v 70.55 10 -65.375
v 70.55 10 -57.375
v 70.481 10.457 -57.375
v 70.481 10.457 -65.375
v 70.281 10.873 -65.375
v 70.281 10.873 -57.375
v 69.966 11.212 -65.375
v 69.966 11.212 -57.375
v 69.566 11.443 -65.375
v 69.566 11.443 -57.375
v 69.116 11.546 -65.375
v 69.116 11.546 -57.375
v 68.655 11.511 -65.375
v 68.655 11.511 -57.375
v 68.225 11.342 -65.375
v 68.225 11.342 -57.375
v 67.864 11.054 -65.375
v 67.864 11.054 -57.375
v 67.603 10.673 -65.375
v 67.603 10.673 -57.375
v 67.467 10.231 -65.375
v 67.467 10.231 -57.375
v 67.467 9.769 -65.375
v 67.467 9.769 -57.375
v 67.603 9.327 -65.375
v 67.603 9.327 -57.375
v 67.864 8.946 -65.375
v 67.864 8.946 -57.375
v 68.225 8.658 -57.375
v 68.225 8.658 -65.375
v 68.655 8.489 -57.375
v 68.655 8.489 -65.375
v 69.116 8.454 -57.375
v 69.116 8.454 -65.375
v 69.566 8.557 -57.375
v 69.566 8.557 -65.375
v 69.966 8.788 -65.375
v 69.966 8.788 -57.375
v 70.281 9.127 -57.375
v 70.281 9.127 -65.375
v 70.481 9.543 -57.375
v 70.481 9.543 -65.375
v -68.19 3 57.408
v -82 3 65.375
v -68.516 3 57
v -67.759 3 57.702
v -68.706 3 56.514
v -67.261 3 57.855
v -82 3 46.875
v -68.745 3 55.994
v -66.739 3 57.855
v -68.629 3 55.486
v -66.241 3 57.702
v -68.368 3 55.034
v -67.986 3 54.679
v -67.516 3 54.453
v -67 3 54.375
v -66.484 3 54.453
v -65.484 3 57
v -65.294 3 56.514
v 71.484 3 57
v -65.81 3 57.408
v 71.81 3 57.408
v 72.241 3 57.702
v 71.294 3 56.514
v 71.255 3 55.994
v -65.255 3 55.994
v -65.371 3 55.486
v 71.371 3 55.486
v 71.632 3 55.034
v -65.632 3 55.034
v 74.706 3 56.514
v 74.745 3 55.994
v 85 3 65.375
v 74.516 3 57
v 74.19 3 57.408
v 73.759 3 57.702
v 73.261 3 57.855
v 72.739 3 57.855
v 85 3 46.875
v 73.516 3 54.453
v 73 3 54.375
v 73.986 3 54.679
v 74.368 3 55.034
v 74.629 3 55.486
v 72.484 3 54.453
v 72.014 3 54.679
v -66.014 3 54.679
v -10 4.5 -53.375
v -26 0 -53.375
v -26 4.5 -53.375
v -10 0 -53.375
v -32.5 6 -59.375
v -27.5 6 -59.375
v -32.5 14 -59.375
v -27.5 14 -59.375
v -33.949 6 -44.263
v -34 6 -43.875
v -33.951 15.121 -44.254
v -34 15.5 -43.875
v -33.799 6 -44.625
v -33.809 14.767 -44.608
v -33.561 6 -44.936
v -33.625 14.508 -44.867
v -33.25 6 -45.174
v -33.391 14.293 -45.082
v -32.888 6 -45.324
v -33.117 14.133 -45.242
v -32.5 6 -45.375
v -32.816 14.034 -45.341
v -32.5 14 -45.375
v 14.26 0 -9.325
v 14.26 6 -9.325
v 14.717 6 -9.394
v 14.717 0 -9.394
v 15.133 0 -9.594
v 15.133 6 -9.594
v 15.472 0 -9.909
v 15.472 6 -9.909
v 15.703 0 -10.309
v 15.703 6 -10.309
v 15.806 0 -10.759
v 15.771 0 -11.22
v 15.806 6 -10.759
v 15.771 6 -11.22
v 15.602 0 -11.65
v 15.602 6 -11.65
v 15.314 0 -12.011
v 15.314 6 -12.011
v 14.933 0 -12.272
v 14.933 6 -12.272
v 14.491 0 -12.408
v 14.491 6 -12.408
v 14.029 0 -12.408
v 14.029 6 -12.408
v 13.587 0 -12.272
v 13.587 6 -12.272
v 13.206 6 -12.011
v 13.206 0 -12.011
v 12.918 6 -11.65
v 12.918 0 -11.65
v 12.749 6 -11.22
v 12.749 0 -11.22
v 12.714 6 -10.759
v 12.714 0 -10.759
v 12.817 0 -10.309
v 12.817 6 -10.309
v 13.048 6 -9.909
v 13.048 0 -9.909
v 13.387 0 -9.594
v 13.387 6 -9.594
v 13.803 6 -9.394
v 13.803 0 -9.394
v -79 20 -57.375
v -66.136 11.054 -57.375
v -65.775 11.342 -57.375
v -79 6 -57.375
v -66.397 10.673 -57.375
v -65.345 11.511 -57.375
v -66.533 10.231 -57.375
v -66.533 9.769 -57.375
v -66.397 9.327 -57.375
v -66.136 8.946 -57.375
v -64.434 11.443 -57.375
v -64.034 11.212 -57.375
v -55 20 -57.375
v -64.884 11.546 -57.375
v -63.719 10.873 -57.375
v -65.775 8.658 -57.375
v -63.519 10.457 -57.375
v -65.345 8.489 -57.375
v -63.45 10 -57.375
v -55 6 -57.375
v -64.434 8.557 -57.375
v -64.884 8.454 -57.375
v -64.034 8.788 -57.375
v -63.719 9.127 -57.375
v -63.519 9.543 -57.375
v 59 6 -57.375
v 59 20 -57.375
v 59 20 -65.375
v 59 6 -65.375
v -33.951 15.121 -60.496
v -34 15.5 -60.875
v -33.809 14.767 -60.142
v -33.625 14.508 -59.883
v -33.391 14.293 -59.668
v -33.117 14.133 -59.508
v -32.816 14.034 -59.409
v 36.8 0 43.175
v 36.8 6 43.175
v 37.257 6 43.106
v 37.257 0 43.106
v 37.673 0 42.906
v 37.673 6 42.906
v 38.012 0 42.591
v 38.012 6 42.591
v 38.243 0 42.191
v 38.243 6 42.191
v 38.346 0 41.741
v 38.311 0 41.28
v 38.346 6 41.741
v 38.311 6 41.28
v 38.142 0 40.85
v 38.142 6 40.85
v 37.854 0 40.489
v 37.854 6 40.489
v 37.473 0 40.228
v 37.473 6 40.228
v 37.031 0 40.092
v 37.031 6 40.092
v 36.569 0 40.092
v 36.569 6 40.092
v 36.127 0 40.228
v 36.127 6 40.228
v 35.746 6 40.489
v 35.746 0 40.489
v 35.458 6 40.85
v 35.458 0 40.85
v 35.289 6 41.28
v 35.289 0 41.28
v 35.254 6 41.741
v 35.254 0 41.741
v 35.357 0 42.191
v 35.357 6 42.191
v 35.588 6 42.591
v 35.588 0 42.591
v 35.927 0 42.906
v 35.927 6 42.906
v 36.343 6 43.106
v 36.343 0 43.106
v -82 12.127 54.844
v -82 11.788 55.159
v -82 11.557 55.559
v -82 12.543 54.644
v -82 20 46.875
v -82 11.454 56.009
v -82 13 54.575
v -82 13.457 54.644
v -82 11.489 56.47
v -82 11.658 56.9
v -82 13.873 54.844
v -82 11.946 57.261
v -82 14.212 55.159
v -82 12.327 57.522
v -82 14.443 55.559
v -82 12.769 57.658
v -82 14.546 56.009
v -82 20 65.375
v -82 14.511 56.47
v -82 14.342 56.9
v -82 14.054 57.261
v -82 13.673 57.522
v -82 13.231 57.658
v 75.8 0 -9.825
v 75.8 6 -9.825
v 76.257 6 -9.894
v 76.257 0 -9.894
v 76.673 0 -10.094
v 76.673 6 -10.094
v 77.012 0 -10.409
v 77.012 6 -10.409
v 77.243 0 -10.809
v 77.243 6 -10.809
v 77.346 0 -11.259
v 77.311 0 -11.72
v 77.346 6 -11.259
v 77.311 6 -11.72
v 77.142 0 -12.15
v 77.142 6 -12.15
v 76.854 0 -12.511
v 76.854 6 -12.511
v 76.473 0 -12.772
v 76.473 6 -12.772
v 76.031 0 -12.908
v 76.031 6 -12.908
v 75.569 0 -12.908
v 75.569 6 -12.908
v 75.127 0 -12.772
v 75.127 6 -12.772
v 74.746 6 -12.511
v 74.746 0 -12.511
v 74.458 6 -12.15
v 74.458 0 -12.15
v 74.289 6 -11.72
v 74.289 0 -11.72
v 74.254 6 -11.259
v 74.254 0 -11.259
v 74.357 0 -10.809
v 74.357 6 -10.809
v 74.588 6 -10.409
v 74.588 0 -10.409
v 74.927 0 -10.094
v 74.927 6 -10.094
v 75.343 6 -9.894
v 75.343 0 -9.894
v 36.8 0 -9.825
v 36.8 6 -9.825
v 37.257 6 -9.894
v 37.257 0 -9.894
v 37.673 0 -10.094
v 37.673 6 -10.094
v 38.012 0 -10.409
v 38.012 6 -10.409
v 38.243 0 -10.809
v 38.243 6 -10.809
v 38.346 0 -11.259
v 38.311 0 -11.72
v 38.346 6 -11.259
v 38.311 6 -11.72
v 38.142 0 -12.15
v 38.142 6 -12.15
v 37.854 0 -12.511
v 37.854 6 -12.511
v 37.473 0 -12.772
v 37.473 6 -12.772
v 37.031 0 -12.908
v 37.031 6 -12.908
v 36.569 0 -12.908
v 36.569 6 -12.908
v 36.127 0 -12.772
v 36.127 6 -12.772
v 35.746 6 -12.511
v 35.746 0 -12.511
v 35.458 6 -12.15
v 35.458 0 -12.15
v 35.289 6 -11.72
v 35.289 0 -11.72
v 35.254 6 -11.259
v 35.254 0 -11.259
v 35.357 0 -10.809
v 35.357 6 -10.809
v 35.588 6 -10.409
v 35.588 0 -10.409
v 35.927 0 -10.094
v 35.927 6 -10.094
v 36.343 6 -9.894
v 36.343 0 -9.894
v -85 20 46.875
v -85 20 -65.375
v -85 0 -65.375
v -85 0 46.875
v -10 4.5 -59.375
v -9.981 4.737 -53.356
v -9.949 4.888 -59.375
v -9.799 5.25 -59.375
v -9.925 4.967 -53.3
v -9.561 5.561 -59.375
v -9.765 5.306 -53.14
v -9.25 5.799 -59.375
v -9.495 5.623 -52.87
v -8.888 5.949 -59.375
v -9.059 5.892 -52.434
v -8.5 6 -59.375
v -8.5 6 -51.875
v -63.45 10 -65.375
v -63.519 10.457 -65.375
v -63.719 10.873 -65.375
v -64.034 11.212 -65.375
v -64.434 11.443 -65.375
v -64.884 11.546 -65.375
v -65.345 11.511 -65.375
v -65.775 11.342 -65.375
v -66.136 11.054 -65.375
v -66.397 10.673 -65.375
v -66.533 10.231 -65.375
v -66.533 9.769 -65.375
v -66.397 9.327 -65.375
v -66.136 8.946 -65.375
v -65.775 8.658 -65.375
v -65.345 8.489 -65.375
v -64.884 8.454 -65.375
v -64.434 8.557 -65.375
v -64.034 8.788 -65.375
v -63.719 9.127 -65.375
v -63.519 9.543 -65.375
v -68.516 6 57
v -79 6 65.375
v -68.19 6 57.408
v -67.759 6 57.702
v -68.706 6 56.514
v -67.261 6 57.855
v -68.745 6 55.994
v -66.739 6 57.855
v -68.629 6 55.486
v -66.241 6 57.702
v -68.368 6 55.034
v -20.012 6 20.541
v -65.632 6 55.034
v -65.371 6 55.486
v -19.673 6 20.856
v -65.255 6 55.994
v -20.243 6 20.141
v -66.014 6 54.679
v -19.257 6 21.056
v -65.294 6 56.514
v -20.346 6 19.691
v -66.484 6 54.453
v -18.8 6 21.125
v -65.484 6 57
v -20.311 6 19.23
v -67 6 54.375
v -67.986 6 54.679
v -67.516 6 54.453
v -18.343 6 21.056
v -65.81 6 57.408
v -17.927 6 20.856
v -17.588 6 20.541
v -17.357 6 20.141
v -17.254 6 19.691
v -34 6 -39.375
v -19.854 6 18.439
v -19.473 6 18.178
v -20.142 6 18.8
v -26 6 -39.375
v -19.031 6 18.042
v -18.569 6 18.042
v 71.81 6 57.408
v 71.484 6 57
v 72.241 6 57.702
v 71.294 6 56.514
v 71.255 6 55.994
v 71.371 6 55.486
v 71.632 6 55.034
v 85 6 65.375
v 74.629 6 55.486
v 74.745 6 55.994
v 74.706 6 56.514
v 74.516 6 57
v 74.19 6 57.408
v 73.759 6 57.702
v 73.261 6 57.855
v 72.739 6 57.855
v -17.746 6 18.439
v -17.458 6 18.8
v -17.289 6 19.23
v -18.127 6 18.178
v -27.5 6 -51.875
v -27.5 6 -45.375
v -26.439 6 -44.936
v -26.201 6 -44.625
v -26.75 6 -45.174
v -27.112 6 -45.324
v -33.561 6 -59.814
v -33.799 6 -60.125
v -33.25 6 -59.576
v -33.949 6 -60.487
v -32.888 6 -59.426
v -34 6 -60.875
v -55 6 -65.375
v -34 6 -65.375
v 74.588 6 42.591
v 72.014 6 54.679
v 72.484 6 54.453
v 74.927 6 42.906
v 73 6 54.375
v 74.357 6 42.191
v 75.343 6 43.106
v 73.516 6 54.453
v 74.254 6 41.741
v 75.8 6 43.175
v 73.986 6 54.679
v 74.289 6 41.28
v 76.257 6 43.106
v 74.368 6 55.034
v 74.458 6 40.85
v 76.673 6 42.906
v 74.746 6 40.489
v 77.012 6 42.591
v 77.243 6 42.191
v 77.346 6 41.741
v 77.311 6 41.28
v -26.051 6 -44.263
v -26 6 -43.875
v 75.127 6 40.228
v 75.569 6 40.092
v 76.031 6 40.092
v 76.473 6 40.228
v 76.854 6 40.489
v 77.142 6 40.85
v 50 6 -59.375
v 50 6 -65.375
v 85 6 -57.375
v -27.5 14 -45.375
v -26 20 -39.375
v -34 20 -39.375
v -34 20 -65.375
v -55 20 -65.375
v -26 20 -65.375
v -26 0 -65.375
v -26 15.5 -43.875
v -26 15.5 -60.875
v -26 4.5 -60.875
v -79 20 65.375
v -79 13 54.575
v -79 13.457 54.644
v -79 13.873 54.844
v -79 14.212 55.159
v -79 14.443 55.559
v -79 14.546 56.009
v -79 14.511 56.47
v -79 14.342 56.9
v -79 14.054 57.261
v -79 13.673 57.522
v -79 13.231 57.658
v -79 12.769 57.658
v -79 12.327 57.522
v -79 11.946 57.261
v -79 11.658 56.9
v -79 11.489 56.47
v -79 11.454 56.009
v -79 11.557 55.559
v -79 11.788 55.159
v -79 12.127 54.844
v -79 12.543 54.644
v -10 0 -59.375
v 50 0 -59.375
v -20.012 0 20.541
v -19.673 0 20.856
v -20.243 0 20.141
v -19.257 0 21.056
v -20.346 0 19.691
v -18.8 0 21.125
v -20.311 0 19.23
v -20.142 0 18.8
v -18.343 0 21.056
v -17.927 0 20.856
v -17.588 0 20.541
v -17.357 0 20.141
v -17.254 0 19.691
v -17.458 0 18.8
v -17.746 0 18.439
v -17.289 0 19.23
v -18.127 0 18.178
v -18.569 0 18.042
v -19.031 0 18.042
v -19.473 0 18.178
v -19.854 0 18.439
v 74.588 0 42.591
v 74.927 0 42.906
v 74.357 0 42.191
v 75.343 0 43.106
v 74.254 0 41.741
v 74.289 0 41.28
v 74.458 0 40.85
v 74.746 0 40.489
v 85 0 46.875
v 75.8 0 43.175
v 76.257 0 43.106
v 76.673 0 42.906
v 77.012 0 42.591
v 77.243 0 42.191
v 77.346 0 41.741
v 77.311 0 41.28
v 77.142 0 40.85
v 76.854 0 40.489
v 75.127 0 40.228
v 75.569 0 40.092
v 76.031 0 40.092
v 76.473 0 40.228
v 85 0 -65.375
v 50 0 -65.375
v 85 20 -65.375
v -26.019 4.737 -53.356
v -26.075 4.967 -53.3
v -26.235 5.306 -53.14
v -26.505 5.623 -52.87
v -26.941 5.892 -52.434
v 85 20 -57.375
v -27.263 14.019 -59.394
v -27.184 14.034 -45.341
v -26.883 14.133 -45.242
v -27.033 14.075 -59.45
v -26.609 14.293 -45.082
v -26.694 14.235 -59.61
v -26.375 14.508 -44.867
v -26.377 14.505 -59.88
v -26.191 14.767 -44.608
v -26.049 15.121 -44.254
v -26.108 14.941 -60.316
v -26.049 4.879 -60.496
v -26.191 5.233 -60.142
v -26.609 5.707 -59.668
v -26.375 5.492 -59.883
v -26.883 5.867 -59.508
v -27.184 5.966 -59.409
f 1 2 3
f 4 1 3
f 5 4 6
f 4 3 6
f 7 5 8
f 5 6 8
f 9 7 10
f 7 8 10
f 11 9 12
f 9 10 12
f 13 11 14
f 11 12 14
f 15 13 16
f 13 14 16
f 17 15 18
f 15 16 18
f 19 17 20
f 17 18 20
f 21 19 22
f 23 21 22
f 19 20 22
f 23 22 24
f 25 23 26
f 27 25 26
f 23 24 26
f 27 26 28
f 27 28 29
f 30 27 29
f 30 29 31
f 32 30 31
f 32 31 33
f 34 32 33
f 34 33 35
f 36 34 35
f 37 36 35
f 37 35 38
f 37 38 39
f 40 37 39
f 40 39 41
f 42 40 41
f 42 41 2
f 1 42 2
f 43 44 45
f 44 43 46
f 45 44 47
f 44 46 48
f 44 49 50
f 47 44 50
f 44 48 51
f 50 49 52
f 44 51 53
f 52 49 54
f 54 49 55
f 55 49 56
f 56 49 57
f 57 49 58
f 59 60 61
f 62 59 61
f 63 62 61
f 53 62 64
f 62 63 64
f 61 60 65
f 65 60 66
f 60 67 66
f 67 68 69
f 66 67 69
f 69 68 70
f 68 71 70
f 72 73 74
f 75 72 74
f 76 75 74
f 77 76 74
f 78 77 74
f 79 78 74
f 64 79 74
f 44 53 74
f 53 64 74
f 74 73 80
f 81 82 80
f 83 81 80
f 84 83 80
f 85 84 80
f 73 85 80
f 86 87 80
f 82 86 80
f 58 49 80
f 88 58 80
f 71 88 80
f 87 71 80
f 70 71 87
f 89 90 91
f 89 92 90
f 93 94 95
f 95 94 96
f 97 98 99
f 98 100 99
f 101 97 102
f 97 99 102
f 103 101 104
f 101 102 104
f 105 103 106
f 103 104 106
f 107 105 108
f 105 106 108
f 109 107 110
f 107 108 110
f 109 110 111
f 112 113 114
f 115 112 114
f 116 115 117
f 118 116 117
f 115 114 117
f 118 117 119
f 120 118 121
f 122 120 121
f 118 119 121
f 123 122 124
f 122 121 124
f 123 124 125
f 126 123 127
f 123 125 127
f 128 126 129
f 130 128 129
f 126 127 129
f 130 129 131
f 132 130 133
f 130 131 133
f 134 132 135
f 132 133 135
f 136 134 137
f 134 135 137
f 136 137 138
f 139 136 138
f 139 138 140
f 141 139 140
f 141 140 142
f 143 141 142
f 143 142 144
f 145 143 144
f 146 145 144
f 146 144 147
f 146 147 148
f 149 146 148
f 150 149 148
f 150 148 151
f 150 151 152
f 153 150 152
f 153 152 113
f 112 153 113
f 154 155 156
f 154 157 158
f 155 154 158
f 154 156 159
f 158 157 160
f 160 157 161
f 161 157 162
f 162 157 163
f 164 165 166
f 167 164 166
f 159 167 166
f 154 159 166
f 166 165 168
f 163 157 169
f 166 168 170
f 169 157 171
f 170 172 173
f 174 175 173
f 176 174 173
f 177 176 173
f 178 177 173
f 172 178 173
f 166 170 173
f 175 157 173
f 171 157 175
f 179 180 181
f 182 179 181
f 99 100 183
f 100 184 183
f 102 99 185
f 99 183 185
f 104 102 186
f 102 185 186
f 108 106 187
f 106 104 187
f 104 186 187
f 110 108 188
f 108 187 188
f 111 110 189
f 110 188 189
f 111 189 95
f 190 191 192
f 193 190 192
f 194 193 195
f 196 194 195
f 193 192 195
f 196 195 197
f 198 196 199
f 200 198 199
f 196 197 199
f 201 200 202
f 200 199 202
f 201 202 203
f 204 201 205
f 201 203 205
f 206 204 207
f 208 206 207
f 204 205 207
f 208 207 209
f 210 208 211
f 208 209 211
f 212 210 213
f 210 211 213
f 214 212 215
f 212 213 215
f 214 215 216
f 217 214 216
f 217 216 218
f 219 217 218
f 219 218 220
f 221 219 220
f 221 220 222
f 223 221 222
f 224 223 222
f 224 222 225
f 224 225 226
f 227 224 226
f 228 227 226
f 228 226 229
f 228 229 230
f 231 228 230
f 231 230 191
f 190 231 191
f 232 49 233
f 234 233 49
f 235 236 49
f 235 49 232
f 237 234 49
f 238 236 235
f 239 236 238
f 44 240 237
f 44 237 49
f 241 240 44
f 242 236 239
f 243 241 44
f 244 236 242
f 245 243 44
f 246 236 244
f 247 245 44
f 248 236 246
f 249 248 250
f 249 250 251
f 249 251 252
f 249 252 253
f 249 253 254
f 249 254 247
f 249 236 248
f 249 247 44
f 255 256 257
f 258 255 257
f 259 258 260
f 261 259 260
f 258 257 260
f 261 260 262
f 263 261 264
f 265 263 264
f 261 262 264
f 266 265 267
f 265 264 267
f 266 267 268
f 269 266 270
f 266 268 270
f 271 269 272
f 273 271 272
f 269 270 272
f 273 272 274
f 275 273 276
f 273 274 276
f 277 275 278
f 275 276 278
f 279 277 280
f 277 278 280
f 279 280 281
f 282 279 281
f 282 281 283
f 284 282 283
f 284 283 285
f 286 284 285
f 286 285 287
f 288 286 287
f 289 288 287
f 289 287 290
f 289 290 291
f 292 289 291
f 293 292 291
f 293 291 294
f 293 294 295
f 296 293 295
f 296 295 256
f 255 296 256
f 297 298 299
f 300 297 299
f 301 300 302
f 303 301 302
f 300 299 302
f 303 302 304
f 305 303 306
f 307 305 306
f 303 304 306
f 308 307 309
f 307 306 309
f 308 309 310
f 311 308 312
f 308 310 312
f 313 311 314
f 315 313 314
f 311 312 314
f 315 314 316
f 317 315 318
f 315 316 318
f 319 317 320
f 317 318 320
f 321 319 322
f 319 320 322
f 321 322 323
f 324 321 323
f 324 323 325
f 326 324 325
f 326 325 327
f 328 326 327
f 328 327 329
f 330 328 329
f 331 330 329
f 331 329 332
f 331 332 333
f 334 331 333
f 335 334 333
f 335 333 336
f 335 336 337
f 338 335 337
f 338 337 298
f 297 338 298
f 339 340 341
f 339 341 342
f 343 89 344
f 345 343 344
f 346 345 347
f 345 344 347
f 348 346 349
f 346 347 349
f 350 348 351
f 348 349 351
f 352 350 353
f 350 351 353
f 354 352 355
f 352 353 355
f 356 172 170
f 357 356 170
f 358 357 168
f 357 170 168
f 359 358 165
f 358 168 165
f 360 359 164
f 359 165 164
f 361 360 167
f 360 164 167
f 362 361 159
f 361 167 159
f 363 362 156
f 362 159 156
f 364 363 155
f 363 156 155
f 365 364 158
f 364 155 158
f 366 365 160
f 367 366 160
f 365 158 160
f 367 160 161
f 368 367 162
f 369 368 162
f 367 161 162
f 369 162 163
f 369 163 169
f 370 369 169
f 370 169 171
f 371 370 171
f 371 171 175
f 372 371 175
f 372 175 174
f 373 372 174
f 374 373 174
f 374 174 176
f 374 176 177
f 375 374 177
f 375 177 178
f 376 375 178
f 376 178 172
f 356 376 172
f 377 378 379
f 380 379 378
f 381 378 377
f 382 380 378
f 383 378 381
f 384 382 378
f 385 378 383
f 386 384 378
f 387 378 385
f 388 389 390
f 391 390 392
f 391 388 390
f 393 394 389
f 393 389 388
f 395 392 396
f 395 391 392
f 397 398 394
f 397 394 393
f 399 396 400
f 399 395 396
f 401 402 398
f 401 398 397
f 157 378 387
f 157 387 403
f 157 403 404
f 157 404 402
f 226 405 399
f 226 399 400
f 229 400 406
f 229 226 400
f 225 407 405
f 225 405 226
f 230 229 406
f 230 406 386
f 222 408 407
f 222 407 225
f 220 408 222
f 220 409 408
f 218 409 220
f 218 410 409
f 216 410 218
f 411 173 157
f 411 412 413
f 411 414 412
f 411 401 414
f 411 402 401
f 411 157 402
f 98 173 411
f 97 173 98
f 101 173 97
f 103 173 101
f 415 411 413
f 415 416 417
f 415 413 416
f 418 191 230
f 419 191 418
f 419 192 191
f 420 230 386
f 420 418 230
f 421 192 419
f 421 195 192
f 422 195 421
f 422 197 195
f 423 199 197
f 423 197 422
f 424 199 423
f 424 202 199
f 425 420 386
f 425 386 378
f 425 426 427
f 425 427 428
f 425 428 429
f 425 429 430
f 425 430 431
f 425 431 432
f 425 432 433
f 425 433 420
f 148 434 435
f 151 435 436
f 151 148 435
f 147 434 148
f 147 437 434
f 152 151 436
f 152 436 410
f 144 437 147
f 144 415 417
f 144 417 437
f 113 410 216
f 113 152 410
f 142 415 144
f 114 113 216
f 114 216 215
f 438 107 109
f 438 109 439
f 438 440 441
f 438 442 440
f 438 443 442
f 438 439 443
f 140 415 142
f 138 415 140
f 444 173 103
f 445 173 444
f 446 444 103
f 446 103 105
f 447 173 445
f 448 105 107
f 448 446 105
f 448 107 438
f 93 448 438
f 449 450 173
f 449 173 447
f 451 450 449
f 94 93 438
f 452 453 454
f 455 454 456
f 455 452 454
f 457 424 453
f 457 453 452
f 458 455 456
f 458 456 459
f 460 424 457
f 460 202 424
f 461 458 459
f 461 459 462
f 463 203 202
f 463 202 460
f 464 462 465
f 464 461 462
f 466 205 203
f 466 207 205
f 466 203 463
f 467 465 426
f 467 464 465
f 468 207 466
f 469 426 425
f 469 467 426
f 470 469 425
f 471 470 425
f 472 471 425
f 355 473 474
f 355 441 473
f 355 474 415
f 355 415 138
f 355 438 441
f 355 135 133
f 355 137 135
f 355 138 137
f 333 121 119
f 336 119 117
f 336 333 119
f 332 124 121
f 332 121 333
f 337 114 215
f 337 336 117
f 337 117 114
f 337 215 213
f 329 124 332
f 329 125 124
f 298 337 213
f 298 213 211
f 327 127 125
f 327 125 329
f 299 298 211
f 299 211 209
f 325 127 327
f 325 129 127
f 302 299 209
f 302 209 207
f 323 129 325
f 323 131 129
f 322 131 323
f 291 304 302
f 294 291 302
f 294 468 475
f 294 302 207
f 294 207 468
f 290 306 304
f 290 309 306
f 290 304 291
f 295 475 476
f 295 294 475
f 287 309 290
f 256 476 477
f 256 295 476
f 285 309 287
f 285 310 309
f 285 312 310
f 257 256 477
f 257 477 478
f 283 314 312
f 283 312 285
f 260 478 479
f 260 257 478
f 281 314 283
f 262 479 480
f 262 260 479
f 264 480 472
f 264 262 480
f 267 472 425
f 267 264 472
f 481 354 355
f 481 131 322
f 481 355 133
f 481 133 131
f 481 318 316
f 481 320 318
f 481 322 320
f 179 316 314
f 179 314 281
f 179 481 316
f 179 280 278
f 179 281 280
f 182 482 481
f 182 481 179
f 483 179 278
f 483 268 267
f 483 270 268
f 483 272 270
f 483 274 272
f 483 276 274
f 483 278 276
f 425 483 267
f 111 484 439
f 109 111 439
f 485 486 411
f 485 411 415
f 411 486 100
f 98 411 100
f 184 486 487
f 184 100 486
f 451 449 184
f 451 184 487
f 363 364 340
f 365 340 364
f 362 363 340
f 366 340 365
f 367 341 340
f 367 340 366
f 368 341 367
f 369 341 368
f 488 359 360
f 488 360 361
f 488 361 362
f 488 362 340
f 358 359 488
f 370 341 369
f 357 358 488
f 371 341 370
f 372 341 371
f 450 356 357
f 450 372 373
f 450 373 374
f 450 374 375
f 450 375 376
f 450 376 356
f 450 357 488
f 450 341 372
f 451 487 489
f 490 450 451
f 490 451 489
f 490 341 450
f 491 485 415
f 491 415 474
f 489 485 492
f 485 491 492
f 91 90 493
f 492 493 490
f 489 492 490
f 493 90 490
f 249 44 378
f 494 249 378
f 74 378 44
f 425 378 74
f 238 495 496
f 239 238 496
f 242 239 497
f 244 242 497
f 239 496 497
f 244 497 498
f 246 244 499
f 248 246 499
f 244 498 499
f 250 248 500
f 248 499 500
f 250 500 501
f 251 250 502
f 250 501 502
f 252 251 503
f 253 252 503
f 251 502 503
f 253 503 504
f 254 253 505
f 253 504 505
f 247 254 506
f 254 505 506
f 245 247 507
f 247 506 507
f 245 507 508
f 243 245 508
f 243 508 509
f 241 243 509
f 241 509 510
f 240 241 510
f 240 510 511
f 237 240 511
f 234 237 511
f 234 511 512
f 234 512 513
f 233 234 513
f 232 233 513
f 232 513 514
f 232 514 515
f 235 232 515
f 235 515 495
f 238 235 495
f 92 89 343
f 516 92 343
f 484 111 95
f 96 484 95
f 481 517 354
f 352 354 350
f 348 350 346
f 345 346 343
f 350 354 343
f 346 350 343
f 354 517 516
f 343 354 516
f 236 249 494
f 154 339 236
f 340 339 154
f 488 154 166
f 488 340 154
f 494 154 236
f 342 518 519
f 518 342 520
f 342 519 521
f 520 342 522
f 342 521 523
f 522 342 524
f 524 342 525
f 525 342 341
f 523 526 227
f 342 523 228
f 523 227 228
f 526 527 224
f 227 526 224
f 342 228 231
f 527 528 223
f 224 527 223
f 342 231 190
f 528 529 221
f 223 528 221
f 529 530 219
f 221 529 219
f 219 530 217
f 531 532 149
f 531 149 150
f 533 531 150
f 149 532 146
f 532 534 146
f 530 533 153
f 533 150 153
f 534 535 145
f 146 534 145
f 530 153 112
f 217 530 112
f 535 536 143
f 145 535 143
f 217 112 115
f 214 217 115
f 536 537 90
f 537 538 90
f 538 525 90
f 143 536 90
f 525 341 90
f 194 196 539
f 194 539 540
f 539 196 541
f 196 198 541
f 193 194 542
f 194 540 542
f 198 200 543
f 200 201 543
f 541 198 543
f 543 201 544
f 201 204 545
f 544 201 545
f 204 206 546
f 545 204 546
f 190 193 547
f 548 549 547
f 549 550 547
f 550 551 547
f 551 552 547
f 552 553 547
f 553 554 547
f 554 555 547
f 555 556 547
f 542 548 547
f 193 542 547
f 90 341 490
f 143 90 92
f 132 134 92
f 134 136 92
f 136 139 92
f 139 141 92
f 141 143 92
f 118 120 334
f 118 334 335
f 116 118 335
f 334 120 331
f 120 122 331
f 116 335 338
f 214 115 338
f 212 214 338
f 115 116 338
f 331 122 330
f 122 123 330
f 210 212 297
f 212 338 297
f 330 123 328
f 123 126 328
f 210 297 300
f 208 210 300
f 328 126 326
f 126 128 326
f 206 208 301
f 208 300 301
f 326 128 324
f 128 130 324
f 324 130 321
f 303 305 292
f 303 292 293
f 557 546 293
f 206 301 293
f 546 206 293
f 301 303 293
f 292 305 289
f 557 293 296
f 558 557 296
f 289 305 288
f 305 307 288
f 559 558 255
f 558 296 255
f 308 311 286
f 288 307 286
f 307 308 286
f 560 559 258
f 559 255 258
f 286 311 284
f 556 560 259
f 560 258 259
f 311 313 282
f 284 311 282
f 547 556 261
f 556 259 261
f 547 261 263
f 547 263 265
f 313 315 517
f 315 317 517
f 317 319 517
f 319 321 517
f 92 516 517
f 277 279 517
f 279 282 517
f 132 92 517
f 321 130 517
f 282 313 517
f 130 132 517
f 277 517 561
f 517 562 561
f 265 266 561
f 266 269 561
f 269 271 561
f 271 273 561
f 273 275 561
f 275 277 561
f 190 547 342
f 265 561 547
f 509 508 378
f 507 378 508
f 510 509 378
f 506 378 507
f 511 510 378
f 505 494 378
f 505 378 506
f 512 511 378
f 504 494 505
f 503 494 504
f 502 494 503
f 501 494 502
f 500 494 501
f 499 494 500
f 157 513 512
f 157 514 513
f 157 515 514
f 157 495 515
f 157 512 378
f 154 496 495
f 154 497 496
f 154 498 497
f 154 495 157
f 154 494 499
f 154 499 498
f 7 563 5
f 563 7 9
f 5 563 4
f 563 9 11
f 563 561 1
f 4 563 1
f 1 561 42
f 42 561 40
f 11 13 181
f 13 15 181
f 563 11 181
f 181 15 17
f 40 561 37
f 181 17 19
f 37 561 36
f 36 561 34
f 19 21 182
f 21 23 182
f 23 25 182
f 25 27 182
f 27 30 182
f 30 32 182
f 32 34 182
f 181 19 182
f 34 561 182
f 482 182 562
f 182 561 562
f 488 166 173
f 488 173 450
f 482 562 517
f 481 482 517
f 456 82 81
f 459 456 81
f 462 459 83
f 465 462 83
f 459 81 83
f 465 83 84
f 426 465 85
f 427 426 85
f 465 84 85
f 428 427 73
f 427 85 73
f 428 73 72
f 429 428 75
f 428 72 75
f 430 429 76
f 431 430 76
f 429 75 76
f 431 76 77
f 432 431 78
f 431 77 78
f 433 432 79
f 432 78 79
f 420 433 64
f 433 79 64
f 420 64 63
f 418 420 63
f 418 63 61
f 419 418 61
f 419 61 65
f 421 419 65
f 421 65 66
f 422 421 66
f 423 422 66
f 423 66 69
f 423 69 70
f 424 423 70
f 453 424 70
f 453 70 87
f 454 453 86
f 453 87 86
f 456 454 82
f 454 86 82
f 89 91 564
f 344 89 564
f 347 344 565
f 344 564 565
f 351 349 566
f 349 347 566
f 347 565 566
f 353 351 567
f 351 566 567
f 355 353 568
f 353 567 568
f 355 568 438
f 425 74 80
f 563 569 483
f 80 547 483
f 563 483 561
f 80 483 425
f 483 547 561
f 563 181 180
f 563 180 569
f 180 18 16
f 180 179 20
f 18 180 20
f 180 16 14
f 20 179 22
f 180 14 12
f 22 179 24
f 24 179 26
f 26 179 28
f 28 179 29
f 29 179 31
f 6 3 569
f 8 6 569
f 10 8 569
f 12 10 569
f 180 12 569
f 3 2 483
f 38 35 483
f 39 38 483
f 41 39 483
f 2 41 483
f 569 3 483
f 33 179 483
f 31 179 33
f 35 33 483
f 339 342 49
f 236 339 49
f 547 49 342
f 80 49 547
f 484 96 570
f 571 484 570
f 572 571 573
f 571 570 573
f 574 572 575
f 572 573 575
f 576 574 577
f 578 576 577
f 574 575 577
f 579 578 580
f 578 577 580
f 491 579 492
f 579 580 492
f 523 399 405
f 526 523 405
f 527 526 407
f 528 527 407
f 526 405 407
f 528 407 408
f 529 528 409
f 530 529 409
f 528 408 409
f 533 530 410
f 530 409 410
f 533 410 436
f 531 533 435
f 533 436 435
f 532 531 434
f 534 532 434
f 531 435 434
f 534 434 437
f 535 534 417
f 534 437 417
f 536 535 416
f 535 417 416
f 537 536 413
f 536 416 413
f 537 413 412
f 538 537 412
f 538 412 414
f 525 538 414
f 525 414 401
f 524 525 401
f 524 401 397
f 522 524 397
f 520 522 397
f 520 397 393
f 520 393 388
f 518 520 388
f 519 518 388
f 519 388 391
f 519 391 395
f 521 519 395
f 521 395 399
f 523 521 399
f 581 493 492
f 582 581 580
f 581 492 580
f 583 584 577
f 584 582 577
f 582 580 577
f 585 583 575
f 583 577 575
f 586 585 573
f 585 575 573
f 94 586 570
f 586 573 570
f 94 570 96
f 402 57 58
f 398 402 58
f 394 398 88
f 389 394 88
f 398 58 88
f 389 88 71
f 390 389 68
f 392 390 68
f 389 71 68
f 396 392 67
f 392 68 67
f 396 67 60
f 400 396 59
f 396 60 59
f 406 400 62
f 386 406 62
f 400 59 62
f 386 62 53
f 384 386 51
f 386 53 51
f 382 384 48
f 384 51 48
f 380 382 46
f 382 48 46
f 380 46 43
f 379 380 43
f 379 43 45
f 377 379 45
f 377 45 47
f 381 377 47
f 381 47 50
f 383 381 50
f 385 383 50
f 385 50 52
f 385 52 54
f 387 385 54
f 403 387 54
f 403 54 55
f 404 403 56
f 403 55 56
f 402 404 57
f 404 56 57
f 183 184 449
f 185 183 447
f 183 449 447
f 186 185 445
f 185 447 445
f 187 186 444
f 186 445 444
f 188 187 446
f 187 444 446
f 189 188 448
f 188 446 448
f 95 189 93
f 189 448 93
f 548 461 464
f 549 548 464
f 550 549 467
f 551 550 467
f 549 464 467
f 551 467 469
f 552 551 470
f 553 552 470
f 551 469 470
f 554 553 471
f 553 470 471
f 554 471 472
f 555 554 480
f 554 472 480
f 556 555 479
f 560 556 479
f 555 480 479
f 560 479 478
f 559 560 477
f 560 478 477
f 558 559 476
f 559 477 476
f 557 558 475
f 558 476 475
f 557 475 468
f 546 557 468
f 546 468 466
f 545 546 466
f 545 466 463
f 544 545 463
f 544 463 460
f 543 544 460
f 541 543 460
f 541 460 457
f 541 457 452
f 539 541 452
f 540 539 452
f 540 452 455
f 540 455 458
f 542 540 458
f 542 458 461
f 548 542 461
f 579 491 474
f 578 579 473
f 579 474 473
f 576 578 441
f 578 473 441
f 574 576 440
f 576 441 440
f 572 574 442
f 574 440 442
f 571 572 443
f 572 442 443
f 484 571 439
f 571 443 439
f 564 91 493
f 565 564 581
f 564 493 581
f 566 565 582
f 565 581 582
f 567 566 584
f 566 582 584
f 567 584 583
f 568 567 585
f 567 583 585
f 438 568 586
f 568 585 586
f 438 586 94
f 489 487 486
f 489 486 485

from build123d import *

# Parameters (mm, degrees)
BOSS_EXTRUDE1_DEPTH = 6
SKETCH2_W           = 30
SKETCH2_H           = 8
SKETCH2_W_2         = 26
BOSS_EXTRUDE2_DEPTH = 14
SKETCH3_R           = 1.55
CUT_EXTRUDE1_DEPTH  = 151.6405075
SKETCH4_W           = 170
SKETCH4_H           = 18.5
CUT_EXTRUDE2_DEPTH  = 3
SKETCH5_R           = 1.75
CUT_EXTRUDE3_DEPTH  = 3
BOSS_EXTRUDE3_REACH = 111.082
CUT_EXTRUDE4_REACH  = 110.143
SKETCH8_W           = 3
SKETCH8_H           = 18.5
SKETCH9_R           = 1.55
CUT_EXTRUDE5_DEPTH  = 10
CUT_EXTRUDE6_REACH  = 110.143
SKETCH10_W          = 16
SKETCH10_H          = 12
SKETCH11_W          = 8
SKETCH11_H          = 26
BOSS_EXTRUDE4_DEPTH = 14
CUT_EXTRUDE7_REACH  = 132.364
FILLET1_R           = 1.5
CUT_EXTRUDE8_REACH  = 110.143
SKETCH15_R          = 1.55


with BuildPart() as part:
    # Sketch1 → Boss-Extrude1 (new body)
    with BuildSketch(Plane(origin=(0, 0, 0), x_dir=(1, 0, 0), z_dir=(0, 1, 0))):
        Polygon((-85, 65.375), (-85, -65.375), (85, -65.375), (85, 65.375), (50, 65.375), (50, 59.375), (-10, 59.375), (-10, 65.375), align=None)
    extrude(amount=BOSS_EXTRUDE1_DEPTH)

    # Sketch2 → Boss-Extrude2 (add)
    with BuildSketch(Plane(origin=(0, 6, 0), x_dir=(1, 0, 0), z_dir=(0, 1, 0))):
        with Locations((-70, 61.375)):
            Rectangle(SKETCH2_W, SKETCH2_H)
        with Locations((72, 61.375)):
            Rectangle(SKETCH2_W_2, SKETCH2_H)
    extrude(amount=BOSS_EXTRUDE2_DEPTH)

    # Sketch3 → Cut-Extrude1 (cut, through all)
    with BuildSketch(Plane.XY.offset(-57.375)):
        with Locations((-65, 10)):
            Circle(SKETCH3_R)
        with Locations((69, 10)):
            Circle(SKETCH3_R)
    extrude(amount=-CUT_EXTRUDE1_DEPTH, mode=Mode.SUBTRACT)

    # Sketch4 → Cut-Extrude2 (cut)
    with BuildSketch(Plane(origin=(0, 0, 0), x_dir=(1, 0, 0), z_dir=(0, 1, 0))):
        with Locations((0, -56.125)):
            Rectangle(SKETCH4_W, SKETCH4_H)
    extrude(amount=CUT_EXTRUDE2_DEPTH, mode=Mode.SUBTRACT)

    # Sketch5 → Cut-Extrude3 (cut)
    with BuildSketch(Plane(origin=(0, 3, 0), x_dir=(-1, 0, 0), z_dir=(0, -1, 0))):
        with Locations(Location((67, -56.125, 0), (0, 0, 90))):
            Circle(SKETCH5_R)
        with Locations(Location((-73, -56.125, 0), (0, 0, 90))):
            Circle(SKETCH5_R)
    extrude(amount=-CUT_EXTRUDE3_DEPTH, mode=Mode.SUBTRACT)

    # Sketch7 → Boss-Extrude3 (add, up to next)
    with BuildSketch(Plane(origin=(0, 20, 0), x_dir=(1, 0, 0), z_dir=(0, 1, 0)), mode=Mode.PRIVATE) as boss_extrude3_sk1:
        Polygon((-79, 65.375), (-85, 65.375), (-85, -46.875), (-82, -46.875), (-82, -65.375), (-79, -65.375), align=None)
    boss_extrude3_tool1 = extrude(boss_extrude3_sk1.sketch, amount=-BOSS_EXTRUDE3_REACH, mode=Mode.PRIVATE) - part.part
    add(boss_extrude3_tool1.solids().sort_by_distance((-81.885802, 20, -4.272891))[0])

    # Sketch8 → Cut-Extrude4 (cut, up to next)
    with BuildSketch(Plane(origin=(0, 6, 0), x_dir=(1, 0, 0), z_dir=(0, 1, 0)), mode=Mode.PRIVATE) as cut_extrude4_sk1:
        with Locations((-83.5, -56.125)):
            Rectangle(SKETCH8_W, SKETCH8_H)
    cut_extrude4_tool1 = extrude(cut_extrude4_sk1.sketch, amount=-CUT_EXTRUDE4_REACH, mode=Mode.PRIVATE) & part.part
    add(cut_extrude4_tool1.solids().sort_by_distance((-83.5, 6, 56.125))[0], mode=Mode.SUBTRACT)

    # Sketch9 → Cut-Extrude5 (cut)
    with BuildSketch(Plane(origin=(-79, 0, 0), x_dir=(0, 0, -1), z_dir=(1, 0, 0))):
        with Locations((-56.125, 13)):
            Circle(SKETCH9_R)
    extrude(amount=-CUT_EXTRUDE5_DEPTH, mode=Mode.SUBTRACT)

    # Sketch10 → Cut-Extrude6 (cut, up to next)
    with BuildSketch(Plane(origin=(0, 6, 0), x_dir=(1, 0, 0), z_dir=(0, 1, 0)), mode=Mode.PRIVATE) as cut_extrude6_sk1:
        with Locations((-18, 59.375)):
            Rectangle(SKETCH10_W, SKETCH10_H)
    cut_extrude6_tool1 = extrude(cut_extrude6_sk1.sketch, amount=-CUT_EXTRUDE6_REACH, mode=Mode.PRIVATE) & part.part
    add(cut_extrude6_tool1.solids().sort_by_distance((-18, 6, -59.375))[0], mode=Mode.SUBTRACT)

    # Sketch11 → Boss-Extrude4 (add)
    with BuildSketch(Plane(origin=(0, 6, 0), x_dir=(1, 0, 0), z_dir=(0, 1, 0))):
        with Locations((-30, 52.375)):
            Rectangle(SKETCH11_W, SKETCH11_H)
    extrude(amount=BOSS_EXTRUDE4_DEPTH)

    # Sketch13 → Cut-Extrude7 (cut, up to next)
    with BuildSketch(Plane(origin=(-26, 0, 0), x_dir=(0, 0, -1), z_dir=(1, 0, 0)), mode=Mode.PRIVATE) as cut_extrude7_sk1:
        Polygon((45.375, 12), (45.375, 6), (59.375, 6), (59.375, 12), (59.375, 14), (45.375, 14), align=None)
    cut_extrude7_tool1 = extrude(cut_extrude7_sk1.sketch, amount=-CUT_EXTRUDE7_REACH, mode=Mode.PRIVATE) & part.part
    add(cut_extrude7_tool1.solids().sort_by_distance((-26, 10, -52.375))[0], mode=Mode.SUBTRACT)

    # Fillet1
    # the kernel refuses this fillet: 1.5 mm, written as the material it takes off along each edge
    with BuildSketch(Plane(origin=(-34, 6, -59.375), x_dir=(0, 0, -1), z_dir=(0, 1, 0)), Plane(origin=(-26, 14, -59.375), x_dir=(0, 0, -1), z_dir=(0, -1, 0)), Plane(origin=(-34, 14, -45.375), x_dir=(0, 0, 1), z_dir=(0, -1, 0)), Plane(origin=(-26, 6, -45.375), x_dir=(0, 0, 1), z_dir=(0, 1, 0))) as fillet1_piece_1:
        with BuildLine():
            CenterArc((FILLET1_R, -FILLET1_R), FILLET1_R, 90, 90)
            Line((0, -FILLET1_R), (0, 0))
            Line((0, 0), (FILLET1_R, 0))
        make_face()
    extrude(amount=8, mode=Mode.SUBTRACT)
    with BuildSketch(Plane(origin=(-34, 14, -59.375), x_dir=(0, 1, 0), z_dir=(0, 0, 1))) as fillet1_piece_2:
        with BuildLine():
            CenterArc((FILLET1_R, -FILLET1_R), FILLET1_R, 90, 90)
            Line((0, -FILLET1_R), (0, 0))
            Line((0, 0), (FILLET1_R, 0))
        make_face()
    extrude(amount=14, mode=Mode.SUBTRACT)
    with BuildSketch(Plane(origin=(-26, 14, -59.375), x_dir=(0, 1, 0), z_dir=(0, 0, 1))) as fillet1_piece_3:
        with BuildLine():
            CenterArc((FILLET1_R, FILLET1_R), FILLET1_R, 180, 90)
            Line((0, FILLET1_R), (0, 0))
            Line((0, 0), (FILLET1_R, 0))
        make_face()
    extrude(amount=14, mode=Mode.SUBTRACT)
    with BuildSketch(Plane(origin=(-10, 6, -53.375), x_dir=(1, 0, 0), z_dir=(0, 0, -1))) as fillet1_piece_4:
        with BuildLine():
            CenterArc((FILLET1_R, FILLET1_R), FILLET1_R, 180, 90)
            Line((0, FILLET1_R), (0, 0))
            Line((0, 0), (FILLET1_R, 0))
        make_face()
    extrude(amount=9.75, mode=Mode.SUBTRACT)
    with BuildSketch(Plane(origin=(-26, 6, -59.375), x_dir=(0, -1, 0), z_dir=(0, 0, 1))) as fillet1_piece_5:
        with BuildLine():
            CenterArc((FILLET1_R, -FILLET1_R), FILLET1_R, 90, 90)
            Line((0, -FILLET1_R), (0, 0))
            Line((0, 0), (FILLET1_R, 0))
        make_face()
    extrude(amount=6, mode=Mode.SUBTRACT)
    with BuildSketch(Plane(origin=(-26, 6, -53.375), x_dir=(0, 0, 1), z_dir=(1, 0, 0))) as fillet1_piece_6:
        with BuildLine():
            CenterArc((FILLET1_R, FILLET1_R), FILLET1_R, 180, 90)
            Line((0, FILLET1_R), (0, 0))
            Line((0, 0), (FILLET1_R, 0))
        make_face()
    extrude(amount=16, mode=Mode.SUBTRACT)
    with BuildSketch(Plane(origin=(-34, 14, -63.125), x_dir=(0, 1, 0), z_dir=(0, 0, 1))) as fillet1_piece_7a_section:
        with BuildLine():
            CenterArc((FILLET1_R, -FILLET1_R), FILLET1_R, 90, 90)
            Line((0, -FILLET1_R), (0, 0))
            Line((0, 0), (FILLET1_R, 0))
        make_face()
    fillet1_piece_7a = extrude(amount=17.75, mode=Mode.PRIVATE)
    fillet1_piece_7a = split(fillet1_piece_7a, bisect_by=Plane(origin=(-33.660407329, 14.339592671, -59.375), z_dir=(0, 0, -1)), keep=Keep.TOP, mode=Mode.PRIVATE)
    with BuildSketch(Plane(origin=(-34, 6, -59.375), x_dir=(0, 0, -1), z_dir=(0, 1, 0))) as fillet1_piece_7b_section:
        with BuildLine():
            CenterArc((FILLET1_R, -FILLET1_R), FILLET1_R, 90, 90)
            Line((0, -FILLET1_R), (0, 0))
            Line((0, 0), (FILLET1_R, 0))
        make_face()
    fillet1_piece_7b = extrude(amount=11.75, mode=Mode.PRIVATE)
    fillet1_piece_7b = split(fillet1_piece_7b, bisect_by=Plane(origin=(-33.660407329, 14, -59.714592671), z_dir=(0, 1, 0)), keep=Keep.TOP, mode=Mode.PRIVATE)
    fillet1_piece_7 = fillet1_piece_7a & fillet1_piece_7b
    add(fillet1_piece_7, mode=Mode.SUBTRACT)
    with BuildSketch(Plane(origin=(-26, 14, -63.125), x_dir=(0, 1, 0), z_dir=(0, 0, 1))) as fillet1_piece_8a_section:
        with BuildLine():
            CenterArc((FILLET1_R, FILLET1_R), FILLET1_R, 180, 90)
            Line((0, FILLET1_R), (0, 0))
            Line((0, 0), (FILLET1_R, 0))
        make_face()
    fillet1_piece_8a = extrude(amount=17.75, mode=Mode.PRIVATE)
    fillet1_piece_8a = split(fillet1_piece_8a, bisect_by=Plane(origin=(-26.339592671, 14.339592671, -59.375), z_dir=(0, 0, -1)), keep=Keep.TOP, mode=Mode.PRIVATE)
    with BuildSketch(Plane(origin=(-26, 17.75, -59.375), x_dir=(0, 0, -1), z_dir=(0, -1, 0))) as fillet1_piece_8b_section:
        with BuildLine():
            CenterArc((FILLET1_R, -FILLET1_R), FILLET1_R, 90, 90)
            Line((0, -FILLET1_R), (0, 0))
            Line((0, 0), (FILLET1_R, 0))
        make_face()
    fillet1_piece_8b = extrude(amount=11.75, mode=Mode.PRIVATE)
    fillet1_piece_8b = split(fillet1_piece_8b, bisect_by=Plane(origin=(-26.339592671, 14, -59.714592671), z_dir=(0, 1, 0)), keep=Keep.TOP, mode=Mode.PRIVATE)
    fillet1_piece_8 = fillet1_piece_8a & fillet1_piece_8b
    add(fillet1_piece_8, mode=Mode.SUBTRACT)
    with BuildSketch(Plane(origin=(-26, 14, -59.375), x_dir=(0, 0, -1), z_dir=(0, -1, 0))) as fillet1_piece_9a_section:
        with BuildLine():
            CenterArc((FILLET1_R, -FILLET1_R), FILLET1_R, 90, 90)
            Line((0, -FILLET1_R), (0, 0))
            Line((0, 0), (FILLET1_R, 0))
        make_face()
    fillet1_piece_9a = extrude(amount=11.75, mode=Mode.PRIVATE)
    fillet1_piece_9a = split(fillet1_piece_9a, bisect_by=Plane(origin=(-26.339592671, 6, -59.714592671), z_dir=(0, -1, 0)), keep=Keep.TOP, mode=Mode.PRIVATE)
    with BuildSketch(Plane(origin=(-26, 6, -63.125), x_dir=(0, -1, 0), z_dir=(0, 0, 1))) as fillet1_piece_9b_section:
        with BuildLine():
            CenterArc((FILLET1_R, -FILLET1_R), FILLET1_R, 90, 90)
            Line((0, -FILLET1_R), (0, 0))
            Line((0, 0), (FILLET1_R, 0))
        make_face()
    fillet1_piece_9b = extrude(amount=9.75, mode=Mode.PRIVATE)
    fillet1_piece_9b = split(fillet1_piece_9b, bisect_by=Plane(origin=(-26.339592671, 5.660407329, -59.375), z_dir=(0, 0, -1)), keep=Keep.TOP, mode=Mode.PRIVATE)
    fillet1_piece_9 = fillet1_piece_9a & fillet1_piece_9b
    add(fillet1_piece_9, mode=Mode.SUBTRACT)
    with BuildSketch(Plane(origin=(-34, 17.75, -45.375), x_dir=(0, 0, 1), z_dir=(0, -1, 0))) as fillet1_piece_10a_section:
        with BuildLine():
            CenterArc((FILLET1_R, -FILLET1_R), FILLET1_R, 90, 90)
            Line((0, -FILLET1_R), (0, 0))
            Line((0, 0), (FILLET1_R, 0))
        make_face()
    fillet1_piece_10a = extrude(amount=11.75, mode=Mode.PRIVATE)
    fillet1_piece_10a = split(fillet1_piece_10a, bisect_by=Plane(origin=(-33.660407329, 14, -45.035407329), z_dir=(0, 1, 0)), keep=Keep.TOP, mode=Mode.PRIVATE)
    with BuildSketch(Plane(origin=(-34, 14, -59.375), x_dir=(0, 1, 0), z_dir=(0, 0, 1))) as fillet1_piece_10b_section:
        with BuildLine():
            CenterArc((FILLET1_R, -FILLET1_R), FILLET1_R, 90, 90)
            Line((0, -FILLET1_R), (0, 0))
            Line((0, 0), (FILLET1_R, 0))
        make_face()
    fillet1_piece_10b = extrude(amount=17.75, mode=Mode.PRIVATE)
    fillet1_piece_10b = split(fillet1_piece_10b, bisect_by=Plane(origin=(-33.660407329, 14.339592671, -45.375), z_dir=(0, 0, 1)), keep=Keep.TOP, mode=Mode.PRIVATE)
    fillet1_piece_10 = fillet1_piece_10a & fillet1_piece_10b
    add(fillet1_piece_10, mode=Mode.SUBTRACT)
    with BuildSketch(Plane(origin=(-26, 6, -45.375), x_dir=(0, 0, 1), z_dir=(0, 1, 0))) as fillet1_piece_11a_section:
        with BuildLine():
            CenterArc((FILLET1_R, -FILLET1_R), FILLET1_R, 90, 90)
            Line((0, -FILLET1_R), (0, 0))
            Line((0, 0), (FILLET1_R, 0))
        make_face()
    fillet1_piece_11a = extrude(amount=11.75, mode=Mode.PRIVATE)
    fillet1_piece_11a = split(fillet1_piece_11a, bisect_by=Plane(origin=(-26.339592671, 14, -45.035407329), z_dir=(0, 1, 0)), keep=Keep.TOP, mode=Mode.PRIVATE)
    with BuildSketch(Plane(origin=(-26, 14, -59.375), x_dir=(0, 1, 0), z_dir=(0, 0, 1))) as fillet1_piece_11b_section:
        with BuildLine():
            CenterArc((FILLET1_R, FILLET1_R), FILLET1_R, 180, 90)
            Line((0, FILLET1_R), (0, 0))
            Line((0, 0), (FILLET1_R, 0))
        make_face()
    fillet1_piece_11b = extrude(amount=17.75, mode=Mode.PRIVATE)
    fillet1_piece_11b = split(fillet1_piece_11b, bisect_by=Plane(origin=(-26.339592671, 14.339592671, -45.375), z_dir=(0, 0, 1)), keep=Keep.TOP, mode=Mode.PRIVATE)
    fillet1_piece_11 = fillet1_piece_11a & fillet1_piece_11b
    add(fillet1_piece_11, mode=Mode.SUBTRACT)
    with BuildSketch(Plane(origin=(-10, 6, -49.625), x_dir=(1, 0, 0), z_dir=(0, 0, -1))) as fillet1_piece_12a_section:
        with BuildLine():
            CenterArc((FILLET1_R, FILLET1_R), FILLET1_R, 180, 90)
            Line((0, FILLET1_R), (0, 0))
            Line((0, 0), (FILLET1_R, 0))
        make_face()
    fillet1_piece_12a = extrude(amount=13.5, mode=Mode.PRIVATE)
    fillet1_piece_12a = split(fillet1_piece_12a, bisect_by=Plane(origin=(-9.660407329, 5.660407329, -53.375), z_dir=(0, 0, 1)), keep=Keep.TOP, mode=Mode.PRIVATE)
    with BuildSketch(Plane(origin=(-26, 6, -53.375), x_dir=(0, 0, 1), z_dir=(1, 0, 0))) as fillet1_piece_12b_section:
        with BuildLine():
            CenterArc((FILLET1_R, FILLET1_R), FILLET1_R, 180, 90)
            Line((0, FILLET1_R), (0, 0))
            Line((0, 0), (FILLET1_R, 0))
        make_face()
    fillet1_piece_12b = extrude(amount=19.75, mode=Mode.PRIVATE)
    fillet1_piece_12b = split(fillet1_piece_12b, bisect_by=Plane(origin=(-10, 5.660407329, -53.035407329), z_dir=(1, 0, 0)), keep=Keep.TOP, mode=Mode.PRIVATE)
    fillet1_piece_12 = fillet1_piece_12a & fillet1_piece_12b
    add(fillet1_piece_12, mode=Mode.SUBTRACT)
    with BuildSketch(Plane(origin=(-26, 6, -59.375), x_dir=(0, -1, 0), z_dir=(0, 0, 1))) as fillet1_piece_13a_section:
        with BuildLine():
            CenterArc((FILLET1_R, -FILLET1_R), FILLET1_R, 90, 90)
            Line((0, -FILLET1_R), (0, 0))
            Line((0, 0), (FILLET1_R, 0))
        make_face()
    fillet1_piece_13a = extrude(amount=9.75, mode=Mode.PRIVATE)
    fillet1_piece_13a = split(fillet1_piece_13a, bisect_by=Plane(origin=(-26.339592671, 5.660407329, -53.375), z_dir=(0, 0, 1)), keep=Keep.TOP, mode=Mode.PRIVATE)
    with BuildSketch(Plane(origin=(-29.75, 6, -53.375), x_dir=(0, 0, 1), z_dir=(1, 0, 0))) as fillet1_piece_13b_section:
        with BuildLine():
            CenterArc((FILLET1_R, FILLET1_R), FILLET1_R, 180, 90)
            Line((0, FILLET1_R), (0, 0))
            Line((0, 0), (FILLET1_R, 0))
        make_face()
    fillet1_piece_13b = extrude(amount=19.75, mode=Mode.PRIVATE)
    fillet1_piece_13b = split(fillet1_piece_13b, bisect_by=Plane(origin=(-26, 5.660407329, -53.035407329), z_dir=(-1, 0, 0)), keep=Keep.TOP, mode=Mode.PRIVATE)
    fillet1_piece_13 = fillet1_piece_13a & fillet1_piece_13b
    add(fillet1_piece_13, mode=Mode.SUBTRACT)

    # Sketch15 → Cut-Extrude8 (cut, up to next)
    with BuildSketch(Plane(origin=(0, 6, 0), x_dir=(1, 0, 0), z_dir=(0, 1, 0)), mode=Mode.PRIVATE) as cut_extrude8_sk1:
        with Locations(Location((-18.8, -19.575, 0), (0, 0, 270))):
            Circle(SKETCH15_R)
    cut_extrude8_tool1 = extrude(cut_extrude8_sk1.sketch, amount=-CUT_EXTRUDE8_REACH, mode=Mode.PRIVATE) & part.part
    # Sketch15 → Cut-Extrude8 (cut, up to next)
    with BuildSketch(Plane(origin=(0, 6, 0), x_dir=(1, 0, 0), z_dir=(0, 1, 0)), mode=Mode.PRIVATE) as cut_extrude8_sk2:
        with Locations(Location((14.26, 10.875, 0), (0, 0, 270))):
            Circle(SKETCH15_R)
    cut_extrude8_tool2 = extrude(cut_extrude8_sk2.sketch, amount=-CUT_EXTRUDE8_REACH, mode=Mode.PRIVATE) & part.part
    # Sketch15 → Cut-Extrude8 (cut, up to next)
    with BuildSketch(Plane(origin=(0, 6, 0), x_dir=(1, 0, 0), z_dir=(0, 1, 0)), mode=Mode.PRIVATE) as cut_extrude8_sk3:
        with Locations(Location((36.8, 11.375, 0), (0, 0, 270))):
            Circle(SKETCH15_R)
    cut_extrude8_tool3 = extrude(cut_extrude8_sk3.sketch, amount=-CUT_EXTRUDE8_REACH, mode=Mode.PRIVATE) & part.part
    # Sketch15 → Cut-Extrude8 (cut, up to next)
    with BuildSketch(Plane(origin=(0, 6, 0), x_dir=(1, 0, 0), z_dir=(0, 1, 0)), mode=Mode.PRIVATE) as cut_extrude8_sk4:
        with Locations(Location((75.8, 11.375, 0), (0, 0, 270))):
            Circle(SKETCH15_R)
    cut_extrude8_tool4 = extrude(cut_extrude8_sk4.sketch, amount=-CUT_EXTRUDE8_REACH, mode=Mode.PRIVATE) & part.part
    # Sketch15 → Cut-Extrude8 (cut, up to next)
    with BuildSketch(Plane(origin=(0, 6, 0), x_dir=(1, 0, 0), z_dir=(0, 1, 0)), mode=Mode.PRIVATE) as cut_extrude8_sk5:
        with Locations(Location((75.8, -41.625, 0), (0, 0, 270))):
            Circle(SKETCH15_R)
    cut_extrude8_tool5 = extrude(cut_extrude8_sk5.sketch, amount=-CUT_EXTRUDE8_REACH, mode=Mode.PRIVATE) & part.part
    # Sketch15 → Cut-Extrude8 (cut, up to next)
    with BuildSketch(Plane(origin=(0, 6, 0), x_dir=(1, 0, 0), z_dir=(0, 1, 0)), mode=Mode.PRIVATE) as cut_extrude8_sk6:
        with Locations(Location((36.8, -41.625, 0), (0, 0, 270))):
            Circle(SKETCH15_R)
    cut_extrude8_tool6 = extrude(cut_extrude8_sk6.sketch, amount=-CUT_EXTRUDE8_REACH, mode=Mode.PRIVATE) & part.part
    add(cut_extrude8_tool1.solids().sort_by_distance((-18.8, 6, 19.575))[0], mode=Mode.SUBTRACT)
    add(cut_extrude8_tool2.solids().sort_by_distance((14.26, 6, -10.875))[0], mode=Mode.SUBTRACT)
    add(cut_extrude8_tool3.solids().sort_by_distance((36.8, 6, -11.375))[0], mode=Mode.SUBTRACT)
    add(cut_extrude8_tool4.solids().sort_by_distance((75.8, 6, -11.375))[0], mode=Mode.SUBTRACT)
    add(cut_extrude8_tool5.solids().sort_by_distance((75.8, 6, 41.625))[0], mode=Mode.SUBTRACT)
    add(cut_extrude8_tool6.solids().sort_by_distance((36.8, 6, 41.625))[0], mode=Mode.SUBTRACT)


solid = part.part
